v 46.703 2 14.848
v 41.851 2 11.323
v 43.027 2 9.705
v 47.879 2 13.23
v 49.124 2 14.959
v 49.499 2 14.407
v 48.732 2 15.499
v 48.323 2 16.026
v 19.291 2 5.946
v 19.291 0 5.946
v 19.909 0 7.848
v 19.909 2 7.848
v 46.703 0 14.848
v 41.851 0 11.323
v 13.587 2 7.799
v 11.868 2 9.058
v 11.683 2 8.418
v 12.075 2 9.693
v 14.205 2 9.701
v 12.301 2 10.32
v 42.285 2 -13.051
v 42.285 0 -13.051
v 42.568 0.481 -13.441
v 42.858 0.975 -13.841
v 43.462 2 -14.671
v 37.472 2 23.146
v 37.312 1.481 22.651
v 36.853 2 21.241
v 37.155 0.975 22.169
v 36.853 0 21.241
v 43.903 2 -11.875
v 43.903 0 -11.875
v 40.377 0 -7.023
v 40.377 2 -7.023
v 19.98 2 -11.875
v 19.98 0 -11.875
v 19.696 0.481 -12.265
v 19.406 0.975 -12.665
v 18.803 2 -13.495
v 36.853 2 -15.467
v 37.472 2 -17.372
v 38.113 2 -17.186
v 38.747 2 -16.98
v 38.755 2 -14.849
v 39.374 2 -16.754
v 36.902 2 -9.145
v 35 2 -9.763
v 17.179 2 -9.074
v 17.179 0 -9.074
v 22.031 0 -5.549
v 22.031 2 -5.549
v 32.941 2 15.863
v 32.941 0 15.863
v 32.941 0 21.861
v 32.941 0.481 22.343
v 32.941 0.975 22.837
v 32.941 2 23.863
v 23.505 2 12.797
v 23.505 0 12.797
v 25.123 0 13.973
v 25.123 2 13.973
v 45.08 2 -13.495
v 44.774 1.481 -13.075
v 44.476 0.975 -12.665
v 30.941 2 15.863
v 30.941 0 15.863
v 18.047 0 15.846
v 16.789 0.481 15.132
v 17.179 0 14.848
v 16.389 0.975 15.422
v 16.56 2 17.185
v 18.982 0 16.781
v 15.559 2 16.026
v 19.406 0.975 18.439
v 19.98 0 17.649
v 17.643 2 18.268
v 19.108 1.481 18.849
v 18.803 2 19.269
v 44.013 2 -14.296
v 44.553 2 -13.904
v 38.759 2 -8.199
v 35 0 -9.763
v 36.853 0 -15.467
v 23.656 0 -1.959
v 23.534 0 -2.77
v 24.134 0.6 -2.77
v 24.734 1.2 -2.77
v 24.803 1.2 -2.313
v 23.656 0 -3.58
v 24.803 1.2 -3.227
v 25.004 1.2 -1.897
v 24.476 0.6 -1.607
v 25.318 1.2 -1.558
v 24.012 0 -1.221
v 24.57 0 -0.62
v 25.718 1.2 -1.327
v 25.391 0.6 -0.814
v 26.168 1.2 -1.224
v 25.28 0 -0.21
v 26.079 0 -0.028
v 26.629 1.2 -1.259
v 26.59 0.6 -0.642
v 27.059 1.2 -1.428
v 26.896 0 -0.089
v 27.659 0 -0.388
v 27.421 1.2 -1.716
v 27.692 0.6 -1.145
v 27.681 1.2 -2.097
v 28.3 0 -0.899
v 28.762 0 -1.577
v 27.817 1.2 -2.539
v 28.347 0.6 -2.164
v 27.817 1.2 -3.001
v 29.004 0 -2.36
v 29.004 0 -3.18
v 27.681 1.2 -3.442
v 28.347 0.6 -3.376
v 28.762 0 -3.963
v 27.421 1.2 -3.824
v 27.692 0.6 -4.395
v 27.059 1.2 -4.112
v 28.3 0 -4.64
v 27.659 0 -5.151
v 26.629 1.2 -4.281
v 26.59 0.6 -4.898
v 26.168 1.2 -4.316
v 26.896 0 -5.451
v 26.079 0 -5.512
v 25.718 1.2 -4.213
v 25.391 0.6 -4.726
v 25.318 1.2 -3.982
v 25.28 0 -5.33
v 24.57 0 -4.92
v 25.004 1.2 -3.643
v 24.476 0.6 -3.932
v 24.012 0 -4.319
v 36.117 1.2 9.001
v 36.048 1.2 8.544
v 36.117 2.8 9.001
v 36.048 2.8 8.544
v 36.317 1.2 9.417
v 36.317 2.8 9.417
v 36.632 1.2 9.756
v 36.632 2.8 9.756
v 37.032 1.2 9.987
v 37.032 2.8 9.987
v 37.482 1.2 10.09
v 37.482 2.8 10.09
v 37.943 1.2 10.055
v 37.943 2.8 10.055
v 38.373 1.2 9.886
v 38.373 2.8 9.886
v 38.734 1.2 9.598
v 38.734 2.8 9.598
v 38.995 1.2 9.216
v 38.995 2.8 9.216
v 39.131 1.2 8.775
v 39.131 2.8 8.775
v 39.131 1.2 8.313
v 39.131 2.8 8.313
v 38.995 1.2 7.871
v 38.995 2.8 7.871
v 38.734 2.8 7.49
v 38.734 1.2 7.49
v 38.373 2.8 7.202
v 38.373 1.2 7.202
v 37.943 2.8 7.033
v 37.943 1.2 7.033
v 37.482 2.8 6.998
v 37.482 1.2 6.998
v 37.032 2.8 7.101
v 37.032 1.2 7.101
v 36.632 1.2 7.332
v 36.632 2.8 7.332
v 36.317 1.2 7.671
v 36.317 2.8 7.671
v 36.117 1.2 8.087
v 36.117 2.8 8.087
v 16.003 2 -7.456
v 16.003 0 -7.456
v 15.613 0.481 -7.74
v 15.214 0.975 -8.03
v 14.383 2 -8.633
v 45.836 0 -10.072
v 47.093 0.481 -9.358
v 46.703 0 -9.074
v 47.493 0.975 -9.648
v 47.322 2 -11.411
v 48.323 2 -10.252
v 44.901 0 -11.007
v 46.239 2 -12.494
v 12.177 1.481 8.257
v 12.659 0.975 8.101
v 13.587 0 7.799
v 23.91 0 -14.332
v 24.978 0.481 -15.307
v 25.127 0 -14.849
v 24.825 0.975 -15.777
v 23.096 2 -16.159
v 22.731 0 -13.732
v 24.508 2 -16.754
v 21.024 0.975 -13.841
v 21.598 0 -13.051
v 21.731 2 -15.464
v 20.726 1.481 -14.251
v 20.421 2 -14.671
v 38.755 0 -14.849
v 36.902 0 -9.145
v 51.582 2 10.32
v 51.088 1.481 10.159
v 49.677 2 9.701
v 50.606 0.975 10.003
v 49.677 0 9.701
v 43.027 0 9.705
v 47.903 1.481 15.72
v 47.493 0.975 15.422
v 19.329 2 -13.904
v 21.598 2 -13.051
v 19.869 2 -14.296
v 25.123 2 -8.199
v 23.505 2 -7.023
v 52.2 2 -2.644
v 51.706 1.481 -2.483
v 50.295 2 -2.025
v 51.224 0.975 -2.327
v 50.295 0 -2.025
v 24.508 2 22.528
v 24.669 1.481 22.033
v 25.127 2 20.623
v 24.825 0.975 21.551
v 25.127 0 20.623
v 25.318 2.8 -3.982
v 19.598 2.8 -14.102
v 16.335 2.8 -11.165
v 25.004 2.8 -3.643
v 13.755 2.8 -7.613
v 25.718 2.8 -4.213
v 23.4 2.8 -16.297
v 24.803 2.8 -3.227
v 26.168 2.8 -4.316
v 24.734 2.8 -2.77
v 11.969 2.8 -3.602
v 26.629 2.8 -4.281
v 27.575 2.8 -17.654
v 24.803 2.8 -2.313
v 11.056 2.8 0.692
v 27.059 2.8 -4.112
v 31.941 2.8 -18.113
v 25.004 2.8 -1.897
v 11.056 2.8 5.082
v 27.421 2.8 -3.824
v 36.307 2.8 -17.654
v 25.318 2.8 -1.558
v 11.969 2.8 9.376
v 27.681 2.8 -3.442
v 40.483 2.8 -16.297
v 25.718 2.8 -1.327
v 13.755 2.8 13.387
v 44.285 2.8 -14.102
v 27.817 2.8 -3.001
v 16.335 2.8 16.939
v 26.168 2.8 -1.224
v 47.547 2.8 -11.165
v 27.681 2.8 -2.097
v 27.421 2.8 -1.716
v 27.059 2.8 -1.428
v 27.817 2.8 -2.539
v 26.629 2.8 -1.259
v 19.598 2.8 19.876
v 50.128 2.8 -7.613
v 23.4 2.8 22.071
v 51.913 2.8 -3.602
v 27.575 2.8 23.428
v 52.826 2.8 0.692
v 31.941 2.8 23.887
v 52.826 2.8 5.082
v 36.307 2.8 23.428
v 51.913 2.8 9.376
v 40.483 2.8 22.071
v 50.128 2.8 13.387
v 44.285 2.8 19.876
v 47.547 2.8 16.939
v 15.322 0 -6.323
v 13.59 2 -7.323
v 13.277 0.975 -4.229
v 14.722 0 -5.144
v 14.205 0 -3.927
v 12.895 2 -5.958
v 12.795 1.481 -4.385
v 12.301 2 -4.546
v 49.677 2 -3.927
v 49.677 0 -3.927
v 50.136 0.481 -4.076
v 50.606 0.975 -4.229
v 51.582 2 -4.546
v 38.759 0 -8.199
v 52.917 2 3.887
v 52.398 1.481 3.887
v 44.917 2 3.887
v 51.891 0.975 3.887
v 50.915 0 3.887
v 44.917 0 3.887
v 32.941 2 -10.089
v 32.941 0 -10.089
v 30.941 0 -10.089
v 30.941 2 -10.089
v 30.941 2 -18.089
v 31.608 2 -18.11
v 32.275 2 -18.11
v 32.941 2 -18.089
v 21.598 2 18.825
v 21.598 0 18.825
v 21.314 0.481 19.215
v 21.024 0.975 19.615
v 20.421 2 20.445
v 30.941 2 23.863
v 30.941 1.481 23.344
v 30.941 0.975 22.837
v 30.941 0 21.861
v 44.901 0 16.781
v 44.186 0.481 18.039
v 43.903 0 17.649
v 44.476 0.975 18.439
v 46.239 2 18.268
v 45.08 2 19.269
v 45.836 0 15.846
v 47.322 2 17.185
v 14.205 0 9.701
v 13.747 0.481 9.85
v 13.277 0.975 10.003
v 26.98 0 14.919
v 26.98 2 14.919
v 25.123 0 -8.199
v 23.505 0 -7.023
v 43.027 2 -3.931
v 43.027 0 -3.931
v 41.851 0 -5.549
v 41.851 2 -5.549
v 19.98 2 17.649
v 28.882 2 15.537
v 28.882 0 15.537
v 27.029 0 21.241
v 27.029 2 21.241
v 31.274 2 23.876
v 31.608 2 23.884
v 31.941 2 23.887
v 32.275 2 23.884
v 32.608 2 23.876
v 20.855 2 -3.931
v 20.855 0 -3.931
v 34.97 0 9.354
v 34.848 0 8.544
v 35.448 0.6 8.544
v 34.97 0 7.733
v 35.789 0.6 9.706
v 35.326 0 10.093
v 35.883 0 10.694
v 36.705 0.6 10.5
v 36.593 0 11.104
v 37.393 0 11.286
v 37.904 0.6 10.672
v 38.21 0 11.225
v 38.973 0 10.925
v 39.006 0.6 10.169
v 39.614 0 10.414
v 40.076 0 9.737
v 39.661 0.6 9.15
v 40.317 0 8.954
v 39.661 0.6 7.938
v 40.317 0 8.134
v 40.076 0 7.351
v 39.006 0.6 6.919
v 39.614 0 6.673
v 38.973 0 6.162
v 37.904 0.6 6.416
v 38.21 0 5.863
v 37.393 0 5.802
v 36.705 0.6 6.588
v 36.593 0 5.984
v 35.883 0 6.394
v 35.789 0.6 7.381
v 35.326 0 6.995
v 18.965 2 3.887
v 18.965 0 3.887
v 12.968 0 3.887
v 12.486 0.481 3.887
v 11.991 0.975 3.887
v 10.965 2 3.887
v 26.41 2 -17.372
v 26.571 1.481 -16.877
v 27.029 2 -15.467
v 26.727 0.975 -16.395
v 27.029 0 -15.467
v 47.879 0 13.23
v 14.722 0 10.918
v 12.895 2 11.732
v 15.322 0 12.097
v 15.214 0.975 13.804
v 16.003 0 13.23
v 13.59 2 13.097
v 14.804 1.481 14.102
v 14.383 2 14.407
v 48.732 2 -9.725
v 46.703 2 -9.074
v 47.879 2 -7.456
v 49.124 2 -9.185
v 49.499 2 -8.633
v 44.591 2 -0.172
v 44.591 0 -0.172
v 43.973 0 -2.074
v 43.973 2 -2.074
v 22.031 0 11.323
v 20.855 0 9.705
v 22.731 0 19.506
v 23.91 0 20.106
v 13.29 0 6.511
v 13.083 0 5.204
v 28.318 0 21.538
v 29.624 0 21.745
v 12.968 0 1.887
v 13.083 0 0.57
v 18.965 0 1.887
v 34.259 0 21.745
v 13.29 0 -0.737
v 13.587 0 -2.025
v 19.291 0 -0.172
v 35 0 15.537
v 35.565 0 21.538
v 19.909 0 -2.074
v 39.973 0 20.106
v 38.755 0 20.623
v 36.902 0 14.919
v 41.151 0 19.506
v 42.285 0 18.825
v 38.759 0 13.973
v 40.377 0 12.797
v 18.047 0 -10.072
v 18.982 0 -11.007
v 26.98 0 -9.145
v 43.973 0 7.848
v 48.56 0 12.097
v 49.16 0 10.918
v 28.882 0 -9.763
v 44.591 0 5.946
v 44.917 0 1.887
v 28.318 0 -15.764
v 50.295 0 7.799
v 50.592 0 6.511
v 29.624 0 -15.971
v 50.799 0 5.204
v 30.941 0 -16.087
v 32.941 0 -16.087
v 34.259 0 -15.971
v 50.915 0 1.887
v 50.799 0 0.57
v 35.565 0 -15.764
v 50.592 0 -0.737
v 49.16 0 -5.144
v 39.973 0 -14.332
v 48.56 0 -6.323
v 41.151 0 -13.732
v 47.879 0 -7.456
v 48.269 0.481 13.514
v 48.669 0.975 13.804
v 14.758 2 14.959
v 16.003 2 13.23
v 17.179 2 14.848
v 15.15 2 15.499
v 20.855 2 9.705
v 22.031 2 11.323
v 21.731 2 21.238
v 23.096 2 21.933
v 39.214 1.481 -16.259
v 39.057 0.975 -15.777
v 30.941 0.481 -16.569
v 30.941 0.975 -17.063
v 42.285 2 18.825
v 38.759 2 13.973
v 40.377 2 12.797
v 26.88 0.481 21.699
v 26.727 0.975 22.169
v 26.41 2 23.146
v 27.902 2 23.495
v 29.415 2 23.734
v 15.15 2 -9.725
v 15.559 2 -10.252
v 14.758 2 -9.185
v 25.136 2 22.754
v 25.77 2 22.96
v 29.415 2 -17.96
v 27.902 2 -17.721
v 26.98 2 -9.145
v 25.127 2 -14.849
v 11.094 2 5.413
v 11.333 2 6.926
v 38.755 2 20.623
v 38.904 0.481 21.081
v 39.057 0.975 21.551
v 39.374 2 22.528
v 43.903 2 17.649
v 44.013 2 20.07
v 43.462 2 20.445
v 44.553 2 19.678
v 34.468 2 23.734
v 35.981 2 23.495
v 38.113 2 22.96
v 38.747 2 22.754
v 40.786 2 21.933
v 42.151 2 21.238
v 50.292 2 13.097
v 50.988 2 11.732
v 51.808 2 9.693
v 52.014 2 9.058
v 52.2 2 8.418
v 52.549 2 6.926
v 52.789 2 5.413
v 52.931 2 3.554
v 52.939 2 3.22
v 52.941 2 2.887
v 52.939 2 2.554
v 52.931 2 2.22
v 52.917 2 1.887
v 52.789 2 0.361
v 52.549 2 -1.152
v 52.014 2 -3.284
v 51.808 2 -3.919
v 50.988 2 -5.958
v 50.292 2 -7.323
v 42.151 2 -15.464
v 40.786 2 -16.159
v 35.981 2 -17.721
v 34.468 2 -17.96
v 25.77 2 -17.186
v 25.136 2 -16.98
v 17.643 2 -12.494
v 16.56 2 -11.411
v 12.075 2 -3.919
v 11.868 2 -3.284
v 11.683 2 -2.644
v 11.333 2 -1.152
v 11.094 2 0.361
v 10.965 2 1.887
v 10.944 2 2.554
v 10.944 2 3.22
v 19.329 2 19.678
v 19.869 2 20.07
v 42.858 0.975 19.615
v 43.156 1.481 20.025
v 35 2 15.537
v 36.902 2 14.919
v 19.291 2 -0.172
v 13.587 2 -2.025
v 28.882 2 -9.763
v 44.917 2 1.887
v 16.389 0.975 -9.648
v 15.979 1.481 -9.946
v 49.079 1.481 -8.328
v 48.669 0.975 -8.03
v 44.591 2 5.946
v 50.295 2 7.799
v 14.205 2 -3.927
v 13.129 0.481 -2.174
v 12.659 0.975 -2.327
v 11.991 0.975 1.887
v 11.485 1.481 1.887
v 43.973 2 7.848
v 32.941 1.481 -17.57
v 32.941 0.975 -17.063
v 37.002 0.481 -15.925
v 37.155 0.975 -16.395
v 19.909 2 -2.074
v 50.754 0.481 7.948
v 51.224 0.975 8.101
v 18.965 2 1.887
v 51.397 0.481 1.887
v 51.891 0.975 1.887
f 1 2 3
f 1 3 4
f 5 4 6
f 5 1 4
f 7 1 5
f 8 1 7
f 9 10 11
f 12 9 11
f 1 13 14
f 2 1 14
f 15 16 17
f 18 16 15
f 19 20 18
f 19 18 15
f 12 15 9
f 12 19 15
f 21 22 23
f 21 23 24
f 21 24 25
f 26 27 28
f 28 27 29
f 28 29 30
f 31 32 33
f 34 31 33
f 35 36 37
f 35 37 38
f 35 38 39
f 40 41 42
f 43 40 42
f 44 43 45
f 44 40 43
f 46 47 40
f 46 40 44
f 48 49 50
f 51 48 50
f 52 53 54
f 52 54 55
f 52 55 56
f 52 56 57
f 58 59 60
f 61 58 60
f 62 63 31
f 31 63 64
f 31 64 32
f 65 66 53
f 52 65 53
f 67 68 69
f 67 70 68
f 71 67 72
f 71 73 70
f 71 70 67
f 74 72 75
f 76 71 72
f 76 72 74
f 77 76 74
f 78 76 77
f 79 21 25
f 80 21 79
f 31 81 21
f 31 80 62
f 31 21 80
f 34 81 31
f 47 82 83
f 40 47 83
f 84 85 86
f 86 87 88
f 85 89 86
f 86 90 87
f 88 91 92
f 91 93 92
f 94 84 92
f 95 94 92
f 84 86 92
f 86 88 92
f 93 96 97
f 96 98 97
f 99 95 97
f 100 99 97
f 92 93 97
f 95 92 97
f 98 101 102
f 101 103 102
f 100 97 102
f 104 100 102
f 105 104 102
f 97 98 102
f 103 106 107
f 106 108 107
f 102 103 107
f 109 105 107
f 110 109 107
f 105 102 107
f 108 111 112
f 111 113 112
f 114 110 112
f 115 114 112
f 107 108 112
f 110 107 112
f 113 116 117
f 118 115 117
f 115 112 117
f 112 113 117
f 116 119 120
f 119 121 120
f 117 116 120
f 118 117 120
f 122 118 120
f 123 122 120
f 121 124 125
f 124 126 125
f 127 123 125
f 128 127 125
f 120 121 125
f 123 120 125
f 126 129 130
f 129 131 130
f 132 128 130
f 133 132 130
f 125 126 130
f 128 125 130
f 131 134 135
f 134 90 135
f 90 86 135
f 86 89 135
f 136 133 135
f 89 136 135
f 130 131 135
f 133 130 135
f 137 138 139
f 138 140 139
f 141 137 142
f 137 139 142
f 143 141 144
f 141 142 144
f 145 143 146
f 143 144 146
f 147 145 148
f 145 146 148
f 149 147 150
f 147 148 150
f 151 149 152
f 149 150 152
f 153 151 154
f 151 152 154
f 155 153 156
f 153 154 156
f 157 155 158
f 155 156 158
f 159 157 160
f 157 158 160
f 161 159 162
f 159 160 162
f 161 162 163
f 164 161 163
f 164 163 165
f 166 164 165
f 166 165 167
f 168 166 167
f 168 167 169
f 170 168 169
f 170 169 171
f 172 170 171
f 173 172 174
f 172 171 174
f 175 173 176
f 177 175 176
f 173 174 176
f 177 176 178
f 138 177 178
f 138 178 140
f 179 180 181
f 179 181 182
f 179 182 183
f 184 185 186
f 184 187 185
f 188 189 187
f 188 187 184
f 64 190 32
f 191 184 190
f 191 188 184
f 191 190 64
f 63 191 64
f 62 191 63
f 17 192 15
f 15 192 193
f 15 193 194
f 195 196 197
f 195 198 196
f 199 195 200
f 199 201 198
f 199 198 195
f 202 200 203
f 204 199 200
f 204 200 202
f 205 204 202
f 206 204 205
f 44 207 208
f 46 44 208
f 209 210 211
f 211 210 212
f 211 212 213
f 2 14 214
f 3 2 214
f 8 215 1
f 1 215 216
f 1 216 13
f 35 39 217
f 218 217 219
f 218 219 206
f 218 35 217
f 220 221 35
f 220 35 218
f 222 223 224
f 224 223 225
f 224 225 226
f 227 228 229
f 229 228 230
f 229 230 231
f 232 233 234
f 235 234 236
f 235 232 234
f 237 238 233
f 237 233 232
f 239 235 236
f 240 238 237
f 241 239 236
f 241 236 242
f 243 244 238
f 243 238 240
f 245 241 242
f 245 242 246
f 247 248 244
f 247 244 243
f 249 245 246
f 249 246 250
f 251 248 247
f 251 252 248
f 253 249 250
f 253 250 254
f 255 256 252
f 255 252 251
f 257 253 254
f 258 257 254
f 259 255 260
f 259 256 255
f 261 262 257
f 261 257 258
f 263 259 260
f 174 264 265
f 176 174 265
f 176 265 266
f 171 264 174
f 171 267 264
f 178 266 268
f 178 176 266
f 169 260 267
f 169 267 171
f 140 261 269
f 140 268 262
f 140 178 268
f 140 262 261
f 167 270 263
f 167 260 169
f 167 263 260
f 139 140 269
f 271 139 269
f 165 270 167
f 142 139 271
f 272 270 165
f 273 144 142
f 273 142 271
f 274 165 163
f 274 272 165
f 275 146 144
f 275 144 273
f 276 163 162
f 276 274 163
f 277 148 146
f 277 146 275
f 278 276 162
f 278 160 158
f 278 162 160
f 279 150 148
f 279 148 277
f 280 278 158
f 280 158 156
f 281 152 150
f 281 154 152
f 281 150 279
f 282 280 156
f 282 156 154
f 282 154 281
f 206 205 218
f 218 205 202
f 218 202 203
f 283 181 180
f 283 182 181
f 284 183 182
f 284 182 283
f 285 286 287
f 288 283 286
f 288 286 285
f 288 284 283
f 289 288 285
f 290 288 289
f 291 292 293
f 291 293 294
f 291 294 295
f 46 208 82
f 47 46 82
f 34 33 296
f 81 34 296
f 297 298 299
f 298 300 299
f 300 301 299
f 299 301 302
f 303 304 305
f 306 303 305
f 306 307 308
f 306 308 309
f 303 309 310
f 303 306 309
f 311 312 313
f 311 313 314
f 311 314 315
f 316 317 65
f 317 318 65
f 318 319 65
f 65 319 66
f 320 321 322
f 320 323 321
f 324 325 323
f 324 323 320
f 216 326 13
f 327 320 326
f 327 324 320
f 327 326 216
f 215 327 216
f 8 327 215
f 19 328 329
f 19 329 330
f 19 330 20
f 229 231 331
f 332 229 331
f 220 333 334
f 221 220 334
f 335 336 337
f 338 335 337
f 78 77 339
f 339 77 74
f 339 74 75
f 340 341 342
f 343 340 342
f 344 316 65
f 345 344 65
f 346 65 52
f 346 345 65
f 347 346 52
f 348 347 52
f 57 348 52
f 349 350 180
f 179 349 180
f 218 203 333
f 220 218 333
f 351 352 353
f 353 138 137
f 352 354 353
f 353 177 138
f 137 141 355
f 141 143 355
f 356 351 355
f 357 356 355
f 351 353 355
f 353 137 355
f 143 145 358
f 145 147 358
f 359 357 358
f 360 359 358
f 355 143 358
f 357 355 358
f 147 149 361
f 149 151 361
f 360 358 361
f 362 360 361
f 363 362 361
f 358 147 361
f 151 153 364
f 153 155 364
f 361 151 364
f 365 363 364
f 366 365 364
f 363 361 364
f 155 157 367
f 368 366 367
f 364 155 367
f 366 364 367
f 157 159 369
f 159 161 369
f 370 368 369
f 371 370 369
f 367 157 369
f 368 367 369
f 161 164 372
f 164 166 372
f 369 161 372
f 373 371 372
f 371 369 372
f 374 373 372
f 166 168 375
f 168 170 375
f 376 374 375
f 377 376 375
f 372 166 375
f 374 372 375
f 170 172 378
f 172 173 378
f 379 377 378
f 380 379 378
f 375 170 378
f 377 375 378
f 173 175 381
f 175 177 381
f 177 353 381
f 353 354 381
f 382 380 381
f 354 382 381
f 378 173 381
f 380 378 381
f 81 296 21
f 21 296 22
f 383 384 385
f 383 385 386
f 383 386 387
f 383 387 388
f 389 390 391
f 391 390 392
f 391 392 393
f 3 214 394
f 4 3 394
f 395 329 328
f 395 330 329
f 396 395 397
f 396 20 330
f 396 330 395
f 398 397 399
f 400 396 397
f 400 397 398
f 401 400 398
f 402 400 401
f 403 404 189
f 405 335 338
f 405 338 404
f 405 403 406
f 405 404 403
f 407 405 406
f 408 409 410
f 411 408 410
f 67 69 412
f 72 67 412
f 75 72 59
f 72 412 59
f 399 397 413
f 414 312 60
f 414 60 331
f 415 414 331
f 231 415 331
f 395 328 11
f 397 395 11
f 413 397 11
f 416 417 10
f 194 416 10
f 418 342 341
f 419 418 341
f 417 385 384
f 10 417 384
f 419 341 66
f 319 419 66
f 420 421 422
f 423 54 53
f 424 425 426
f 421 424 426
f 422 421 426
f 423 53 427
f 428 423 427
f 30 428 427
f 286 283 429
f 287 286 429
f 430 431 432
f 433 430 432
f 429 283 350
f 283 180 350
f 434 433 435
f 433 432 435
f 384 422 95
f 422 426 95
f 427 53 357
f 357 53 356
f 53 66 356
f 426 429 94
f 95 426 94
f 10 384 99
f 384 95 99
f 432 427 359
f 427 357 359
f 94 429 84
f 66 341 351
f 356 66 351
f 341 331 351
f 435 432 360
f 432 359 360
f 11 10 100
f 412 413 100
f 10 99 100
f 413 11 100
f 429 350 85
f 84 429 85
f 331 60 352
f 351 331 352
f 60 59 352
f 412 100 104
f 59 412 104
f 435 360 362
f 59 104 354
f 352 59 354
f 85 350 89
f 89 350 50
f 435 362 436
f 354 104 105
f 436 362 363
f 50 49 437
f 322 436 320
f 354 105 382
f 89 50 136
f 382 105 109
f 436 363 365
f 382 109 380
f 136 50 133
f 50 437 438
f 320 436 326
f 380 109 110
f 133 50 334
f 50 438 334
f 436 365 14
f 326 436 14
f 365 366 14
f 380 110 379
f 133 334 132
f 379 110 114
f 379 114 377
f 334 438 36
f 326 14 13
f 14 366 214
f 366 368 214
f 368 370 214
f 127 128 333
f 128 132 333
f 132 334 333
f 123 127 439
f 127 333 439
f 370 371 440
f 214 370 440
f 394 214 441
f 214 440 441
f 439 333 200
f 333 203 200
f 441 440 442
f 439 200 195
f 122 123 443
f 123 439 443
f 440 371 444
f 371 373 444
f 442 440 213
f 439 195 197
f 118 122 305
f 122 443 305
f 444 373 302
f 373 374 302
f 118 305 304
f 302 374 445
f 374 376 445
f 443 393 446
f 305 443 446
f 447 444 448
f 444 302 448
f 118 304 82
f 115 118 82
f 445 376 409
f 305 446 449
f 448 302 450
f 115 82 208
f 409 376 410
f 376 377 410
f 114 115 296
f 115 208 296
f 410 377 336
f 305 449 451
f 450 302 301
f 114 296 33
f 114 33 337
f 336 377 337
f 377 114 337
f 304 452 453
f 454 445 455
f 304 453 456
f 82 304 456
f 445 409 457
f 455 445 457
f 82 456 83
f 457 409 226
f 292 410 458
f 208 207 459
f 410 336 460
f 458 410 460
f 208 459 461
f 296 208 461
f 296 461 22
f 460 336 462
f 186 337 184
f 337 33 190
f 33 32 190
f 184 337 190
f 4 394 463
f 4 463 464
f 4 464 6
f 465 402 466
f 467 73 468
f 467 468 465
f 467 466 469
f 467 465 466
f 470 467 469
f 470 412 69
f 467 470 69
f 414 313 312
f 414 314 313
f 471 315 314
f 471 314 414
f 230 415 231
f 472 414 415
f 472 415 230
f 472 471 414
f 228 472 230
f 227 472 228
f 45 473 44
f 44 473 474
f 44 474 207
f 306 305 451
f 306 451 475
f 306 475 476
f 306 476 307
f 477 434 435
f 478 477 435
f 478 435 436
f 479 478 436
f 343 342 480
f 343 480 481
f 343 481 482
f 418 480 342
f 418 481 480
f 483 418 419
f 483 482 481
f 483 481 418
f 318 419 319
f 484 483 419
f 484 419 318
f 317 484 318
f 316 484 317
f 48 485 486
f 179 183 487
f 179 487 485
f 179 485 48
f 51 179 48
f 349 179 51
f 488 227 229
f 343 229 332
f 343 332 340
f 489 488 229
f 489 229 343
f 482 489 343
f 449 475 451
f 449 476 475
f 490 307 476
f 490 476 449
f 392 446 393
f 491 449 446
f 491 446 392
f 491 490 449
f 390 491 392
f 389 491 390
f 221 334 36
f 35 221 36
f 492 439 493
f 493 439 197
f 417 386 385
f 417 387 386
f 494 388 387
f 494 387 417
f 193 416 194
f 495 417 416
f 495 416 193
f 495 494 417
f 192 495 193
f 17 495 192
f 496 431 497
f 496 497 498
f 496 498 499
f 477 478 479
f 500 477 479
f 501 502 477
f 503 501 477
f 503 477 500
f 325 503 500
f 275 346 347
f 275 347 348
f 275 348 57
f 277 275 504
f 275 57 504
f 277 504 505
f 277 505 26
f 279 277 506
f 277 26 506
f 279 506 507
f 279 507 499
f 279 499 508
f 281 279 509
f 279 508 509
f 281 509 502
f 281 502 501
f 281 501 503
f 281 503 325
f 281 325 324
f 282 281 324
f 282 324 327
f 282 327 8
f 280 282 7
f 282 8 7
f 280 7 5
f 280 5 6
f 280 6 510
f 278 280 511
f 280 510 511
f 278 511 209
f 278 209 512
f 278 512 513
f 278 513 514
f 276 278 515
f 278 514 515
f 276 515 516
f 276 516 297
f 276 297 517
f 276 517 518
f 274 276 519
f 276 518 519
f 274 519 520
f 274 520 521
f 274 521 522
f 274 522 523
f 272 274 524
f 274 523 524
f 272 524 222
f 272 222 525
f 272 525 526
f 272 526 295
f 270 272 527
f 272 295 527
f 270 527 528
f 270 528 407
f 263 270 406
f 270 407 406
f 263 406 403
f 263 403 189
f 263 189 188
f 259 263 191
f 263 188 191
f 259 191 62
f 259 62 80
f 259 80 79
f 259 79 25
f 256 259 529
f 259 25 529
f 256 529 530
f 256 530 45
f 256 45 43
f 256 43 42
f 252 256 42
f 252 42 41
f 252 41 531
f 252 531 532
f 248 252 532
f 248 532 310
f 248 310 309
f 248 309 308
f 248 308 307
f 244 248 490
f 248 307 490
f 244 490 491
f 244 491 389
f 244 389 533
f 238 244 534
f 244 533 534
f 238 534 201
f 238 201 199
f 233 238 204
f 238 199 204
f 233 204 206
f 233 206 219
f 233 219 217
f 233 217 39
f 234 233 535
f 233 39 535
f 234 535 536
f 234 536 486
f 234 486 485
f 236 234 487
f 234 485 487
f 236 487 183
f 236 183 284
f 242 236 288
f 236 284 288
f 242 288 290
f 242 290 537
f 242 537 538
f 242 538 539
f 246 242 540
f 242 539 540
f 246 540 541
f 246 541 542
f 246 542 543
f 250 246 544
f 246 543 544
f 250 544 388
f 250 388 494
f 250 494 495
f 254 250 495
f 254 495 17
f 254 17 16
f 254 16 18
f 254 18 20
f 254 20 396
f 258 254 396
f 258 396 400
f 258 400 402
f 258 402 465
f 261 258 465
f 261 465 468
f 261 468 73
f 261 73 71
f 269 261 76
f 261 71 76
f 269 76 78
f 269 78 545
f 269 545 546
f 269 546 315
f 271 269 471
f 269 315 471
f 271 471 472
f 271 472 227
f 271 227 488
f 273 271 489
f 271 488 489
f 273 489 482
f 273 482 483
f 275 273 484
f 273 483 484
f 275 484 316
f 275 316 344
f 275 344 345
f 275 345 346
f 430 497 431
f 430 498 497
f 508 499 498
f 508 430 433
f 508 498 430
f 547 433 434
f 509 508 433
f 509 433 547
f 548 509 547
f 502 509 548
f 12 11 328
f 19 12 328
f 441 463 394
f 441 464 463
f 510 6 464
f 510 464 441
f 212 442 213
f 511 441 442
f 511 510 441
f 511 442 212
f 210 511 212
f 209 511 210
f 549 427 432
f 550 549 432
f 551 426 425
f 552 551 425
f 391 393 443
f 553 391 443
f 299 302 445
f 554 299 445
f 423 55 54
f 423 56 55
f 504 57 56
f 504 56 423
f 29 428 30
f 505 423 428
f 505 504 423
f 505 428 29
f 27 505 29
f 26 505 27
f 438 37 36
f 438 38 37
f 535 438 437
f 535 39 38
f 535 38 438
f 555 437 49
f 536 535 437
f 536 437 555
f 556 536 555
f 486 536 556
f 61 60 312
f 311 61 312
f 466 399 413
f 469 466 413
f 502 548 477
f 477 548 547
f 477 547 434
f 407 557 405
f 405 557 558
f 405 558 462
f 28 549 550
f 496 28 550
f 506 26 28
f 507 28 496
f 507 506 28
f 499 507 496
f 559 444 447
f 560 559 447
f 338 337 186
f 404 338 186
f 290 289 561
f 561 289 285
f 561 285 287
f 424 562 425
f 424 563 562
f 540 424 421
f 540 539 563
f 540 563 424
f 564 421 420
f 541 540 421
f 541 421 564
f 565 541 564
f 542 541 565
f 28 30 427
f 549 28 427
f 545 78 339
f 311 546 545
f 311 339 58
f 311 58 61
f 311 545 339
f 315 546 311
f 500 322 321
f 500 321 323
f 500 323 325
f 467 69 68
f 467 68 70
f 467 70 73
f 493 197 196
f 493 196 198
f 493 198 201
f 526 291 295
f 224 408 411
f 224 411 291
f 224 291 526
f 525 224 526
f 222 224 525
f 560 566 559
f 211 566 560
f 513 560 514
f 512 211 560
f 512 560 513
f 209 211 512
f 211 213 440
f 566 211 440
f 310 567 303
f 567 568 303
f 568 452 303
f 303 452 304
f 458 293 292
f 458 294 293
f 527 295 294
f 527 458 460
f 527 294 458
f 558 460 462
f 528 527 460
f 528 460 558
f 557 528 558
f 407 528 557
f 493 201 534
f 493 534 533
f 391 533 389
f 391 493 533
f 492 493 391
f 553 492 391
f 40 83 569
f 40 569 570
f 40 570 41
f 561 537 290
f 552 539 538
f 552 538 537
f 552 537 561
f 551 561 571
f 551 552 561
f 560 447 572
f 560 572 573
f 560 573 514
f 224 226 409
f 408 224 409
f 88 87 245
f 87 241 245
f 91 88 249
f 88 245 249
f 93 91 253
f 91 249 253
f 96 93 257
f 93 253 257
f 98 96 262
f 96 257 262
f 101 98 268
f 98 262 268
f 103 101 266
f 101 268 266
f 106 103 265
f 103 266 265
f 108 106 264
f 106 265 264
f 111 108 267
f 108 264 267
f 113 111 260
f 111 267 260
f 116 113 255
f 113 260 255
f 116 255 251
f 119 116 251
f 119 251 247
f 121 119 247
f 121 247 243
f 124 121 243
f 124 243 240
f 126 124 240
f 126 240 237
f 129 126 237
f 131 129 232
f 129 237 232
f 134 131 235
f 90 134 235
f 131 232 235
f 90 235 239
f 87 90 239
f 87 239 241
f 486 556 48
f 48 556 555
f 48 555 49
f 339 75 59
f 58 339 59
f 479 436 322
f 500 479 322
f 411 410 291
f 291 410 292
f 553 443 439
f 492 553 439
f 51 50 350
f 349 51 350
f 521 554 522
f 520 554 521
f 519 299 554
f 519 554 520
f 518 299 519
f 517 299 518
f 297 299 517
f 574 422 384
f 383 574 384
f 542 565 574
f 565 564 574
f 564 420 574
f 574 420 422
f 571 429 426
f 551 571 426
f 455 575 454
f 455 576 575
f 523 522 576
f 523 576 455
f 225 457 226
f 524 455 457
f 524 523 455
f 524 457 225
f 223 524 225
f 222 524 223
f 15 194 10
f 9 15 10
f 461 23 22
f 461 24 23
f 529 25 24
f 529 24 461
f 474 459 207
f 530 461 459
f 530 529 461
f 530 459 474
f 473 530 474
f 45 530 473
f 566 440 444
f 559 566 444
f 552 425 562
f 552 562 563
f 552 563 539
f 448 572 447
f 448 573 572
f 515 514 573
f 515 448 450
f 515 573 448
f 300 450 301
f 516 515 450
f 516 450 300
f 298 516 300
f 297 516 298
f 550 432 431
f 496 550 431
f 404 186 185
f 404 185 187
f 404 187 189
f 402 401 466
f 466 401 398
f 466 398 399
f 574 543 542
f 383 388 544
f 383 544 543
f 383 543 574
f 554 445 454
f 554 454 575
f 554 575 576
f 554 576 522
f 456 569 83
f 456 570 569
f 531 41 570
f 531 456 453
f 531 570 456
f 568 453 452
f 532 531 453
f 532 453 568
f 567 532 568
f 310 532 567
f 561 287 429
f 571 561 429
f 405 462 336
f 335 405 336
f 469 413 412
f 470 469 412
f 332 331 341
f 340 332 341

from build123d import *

# Parameters (mm, degrees)
SKETCH2_R                                         = 21
SKETCH2_R_2                                       = 7.5
BOSS_EXTRUDE1_DEPTH                               = 2.8
CSK_FOR_M2_5_FLAT_HEAD_MACHINE_SCREW1_D           = 3.1
CSK_FOR_M2_5_FLAT_HEAD_MACHINE_SCREW1_CSINK_D     = 5.5
CSK_FOR_M2_5_FLAT_HEAD_MACHINE_SCREW1_CSINK_ANGLE = 90
CHAMFER1_SIZE                                     = 2
CUT_EXTRUDE1_DEPTH                                = 2


with BuildPart() as part:
    # Sketch2 → Boss-Extrude1 (new body)
    # profile 1 of 3: a face of its own
    with BuildSketch(Plane(origin=(0, 0, 0), x_dir=(1, 0, 0), z_dir=(0, 1, 0))):
        with Locations(Location((31.941171231, -2.886996739, 0), (0, 0, 270))):
            Circle(SKETCH2_R)
        with Locations((22.748783076, -12.079384894)):
            Circle(SKETCH2_R_2, mode=Mode.SUBTRACT)
        with Locations((41.133559387, 6.305391417)):
            Circle(SKETCH2_R_2, mode=Mode.SUBTRACT)
    # profile 2 of 3: a face of its own
    with BuildSketch(Plane(origin=(0, 0, 0), x_dir=(1, 0, 0), z_dir=(0, 1, 0))):
        with Locations((22.748783076, -12.079384894)):
            Circle(SKETCH2_R_2)
    # profile 3 of 3: a face of its own
    with BuildSketch(Plane(origin=(0, 0, 0), x_dir=(1, 0, 0), z_dir=(0, 1, 0))):
        with Locations((41.133559387, 6.305391417)):
            Circle(SKETCH2_R_2)
    extrude(amount=BOSS_EXTRUDE1_DEPTH)

    # CSK for M2.5 Flat Head Machine Screw1 (through all)
    with Locations(Plane.XZ):
        with Locations((26.284316982, -2.769857511), (37.598025481, 8.543850988)):
            CounterSinkHole(CSK_FOR_M2_5_FLAT_HEAD_MACHINE_SCREW1_D / 2, CSK_FOR_M2_5_FLAT_HEAD_MACHINE_SCREW1_CSINK_D / 2, counter_sink_angle=CSK_FOR_M2_5_FLAT_HEAD_MACHINE_SCREW1_CSINK_ANGLE)

    # Chamfer1
    chamfer1_edges = [part.edges().sort_by_distance(p)[0] for p in [
        (31.941171231, 0, -18.113003261),
    ]]
    chamfer(chamfer1_edges, length=CHAMFER1_SIZE)

    # Sketch5 → Cut-Extrude1 (cut)
    with BuildSketch(Plane.XZ):
        with BuildLine():
            Line((19.291076579, -0.171805949), (13.587125587, -2.025131973))
            ThreePointArc((13.587125587, -2.025131973), (13.871097422, -2.984326154), (14.205159576, -3.927245005))
            Line((14.205159576, -3.927245005), (19.909110568, -2.073918981))
            Line((19.909110568, -2.073918981), (19.291076579, -0.171805949))
        make_face()
        with BuildLine():
            Line((20.855438294, -3.931191717), (16.003367771, -7.456427301))
            ThreePointArc((16.003367771, -7.456427301), (16.569848338, -8.280923055), (17.178938276, -9.07446129))
            Line((17.178938276, -9.07446129), (22.031008798, -5.549225706))
            Line((22.031008798, -5.549225706), (20.855438294, -3.931191717))
        make_face()
        with BuildLine():
            Line((23.504948787, -7.023165694), (19.979713203, -11.875236217))
            ThreePointArc((19.979713203, -11.875236217), (20.773251438, -12.484326154), (21.597747192, -13.050806722))
            Line((21.597747192, -13.050806722), (25.122982776, -8.198736199))
            Line((25.122982776, -8.198736199), (23.504948787, -7.023165694))
        make_face()
        with BuildLine():
            Line((19.979713203, -11.875236217), (18.802666769, -13.495301649))
            ThreePointArc((18.802666769, -13.495301649), (19.597680933, -14.102360143), (20.420700757, -14.670872154))
            Line((20.420700757, -14.670872154), (21.597747192, -13.050806722))
            ThreePointArc((21.597747192, -13.050806722), (20.773251438, -12.484326154), (19.979713203, -11.875236217))
        make_face()
        with BuildLine():
            Line((25.126929488, -14.849014917), (24.508119556, -16.753516055))
            ThreePointArc((24.508119556, -16.753516055), (25.45181435, -17.085190104), (26.410232589, -17.371550044))
            Line((26.410232589, -17.371550044), (27.02904252, -15.467048906))
            ThreePointArc((27.02904252, -15.467048906), (26.069848338, -15.183077071), (25.126929488, -14.849014917))
        make_face()
        with BuildLine():
            Line((26.980255511, -9.145063925), (25.126929488, -14.849014917))
            ThreePointArc((25.126929488, -14.849014917), (26.069848338, -15.183077071), (27.02904252, -15.467048906))
            Line((27.02904252, -15.467048906), (28.882368544, -9.763097913))
            Line((28.882368544, -9.763097913), (26.980255511, -9.145063925))
        make_face()
        with BuildLine():
            Line((30.941171231, -10.089180225), (30.941171231, -16.086669222))
            ThreePointArc((30.941171231, -16.086669222), (31.941171231, -16.113003261), (32.941171231, -16.086669222))
            Line((32.941171231, -16.086669222), (32.941171231, -10.089180225))
            Line((32.941171231, -10.089180225), (30.941171231, -10.089180225))
        make_face()
        with BuildLine():
            Line((30.941171231, -16.086669222), (30.941171231, -18.089180225))
            ThreePointArc((30.941171231, -18.089180225), (31.941171231, -18.113003261), (32.941171231, -18.089180225))
            Line((32.941171231, -18.089180225), (32.941171231, -16.086669222))
            ThreePointArc((32.941171231, -16.086669222), (31.941171231, -16.113003261), (30.941171231, -16.086669222))
        make_face()
        with BuildLine():
            ThreePointArc((36.853299943, -15.467048906), (37.812494125, -15.183077071), (38.755412975, -14.849014917))
            Line((38.755412975, -14.849014917), (36.902086951, -9.145063925))
            Line((36.902086951, -9.145063925), (34.999973919, -9.763097913))
            Line((34.999973919, -9.763097913), (36.853299943, -15.467048906))
        make_face()
        with BuildLine():
            ThreePointArc((37.472109874, -17.371550044), (38.430528113, -17.085190104), (39.374222906, -16.753516055))
            Line((39.374222906, -16.753516055), (38.755412975, -14.849014917))
            ThreePointArc((38.755412975, -14.849014917), (37.812494125, -15.183077071), (36.853299943, -15.467048906))
            Line((36.853299943, -15.467048906), (37.472109874, -17.371550044))
        make_face()
        with BuildLine():
            ThreePointArc((42.284595271, -13.050806722), (43.109091025, -12.484326154), (43.90262926, -11.875236217))
            Line((43.90262926, -11.875236217), (40.377393676, -7.023165694))
            Line((40.377393676, -7.023165694), (38.759359687, -8.198736199))
            Line((38.759359687, -8.198736199), (42.284595271, -13.050806722))
        make_face()
        with BuildLine():
            ThreePointArc((43.461641706, -14.670872154), (44.28466153, -14.102360143), (45.079675694, -13.495301649))
            Line((45.079675694, -13.495301649), (43.90262926, -11.875236217))
            ThreePointArc((43.90262926, -11.875236217), (43.109091025, -12.484326154), (42.284595271, -13.050806722))
            Line((42.284595271, -13.050806722), (43.461641706, -14.670872154))
        make_face()
        with BuildLine():
            ThreePointArc((46.703404187, -9.07446129), (47.312494125, -8.280923055), (47.878974692, -7.456427301))
            Line((47.878974692, -7.456427301), (43.026904169, -3.931191717))
            Line((43.026904169, -3.931191717), (41.851333665, -5.549225706))
            Line((41.851333665, -5.549225706), (46.703404187, -9.07446129))
        make_face()
        with BuildLine():
            ThreePointArc((48.32346962, -10.251507724), (48.930528113, -9.456493559), (49.499040124, -8.633473736))
            Line((49.499040124, -8.633473736), (47.878974692, -7.456427301))
            ThreePointArc((47.878974692, -7.456427301), (47.312494125, -8.280923055), (46.703404187, -9.07446129))
            Line((46.703404187, -9.07446129), (48.32346962, -10.251507724))
        make_face()
        with BuildLine():
            ThreePointArc((49.677182887, -3.927245005), (50.011245041, -2.984326154), (50.295216876, -2.025131973))
            Line((50.295216876, -2.025131973), (44.591265883, -0.171805949))
            Line((44.591265883, -0.171805949), (43.973231895, -2.073918981))
            Line((43.973231895, -2.073918981), (49.677182887, -3.927245005))
        make_face()
        with BuildLine():
            ThreePointArc((51.581684025, -4.546054936), (51.913358074, -3.602360143), (52.199718014, -2.643941904))
            Line((52.199718014, -2.643941904), (50.295216876, -2.025131973))
            ThreePointArc((50.295216876, -2.025131973), (50.011245041, -2.984326154), (49.677182887, -3.927245005))
            Line((49.677182887, -3.927245005), (51.581684025, -4.546054936))
        make_face()
        with BuildLine():
            ThreePointArc((52.941171231, 2.886996739), (52.935214628, 3.387138603), (52.917348195, 3.886996739))
            Line((52.917348195, 3.886996739), (50.914837192, 3.886996739))
            ThreePointArc((50.914837192, 3.886996739), (50.934586581, 3.387170079), (50.941171231, 2.886996739))
            ThreePointArc((50.941171231, 2.886996739), (50.934586581, 2.386823398), (50.914837192, 1.886996739))
            Line((50.914837192, 1.886996739), (52.917348195, 1.886996739))
            ThreePointArc((52.917348195, 1.886996739), (52.935214628, 2.386854875), (52.941171231, 2.886996739))
        make_face()
        with BuildLine():
            ThreePointArc((50.941171231, 2.886996739), (50.934586581, 3.387170079), (50.914837192, 3.886996739))
            Line((50.914837192, 3.886996739), (44.917348195, 3.886996739))
            Line((44.917348195, 3.886996739), (44.917348195, 1.886996739))
            Line((44.917348195, 1.886996739), (50.914837192, 1.886996739))
            ThreePointArc((50.914837192, 1.886996739), (50.934586581, 2.386823398), (50.941171231, 2.886996739))
        make_face()
        with BuildLine():
            ThreePointArc((52.199718014, 8.417935381), (51.913358074, 9.376353621), (51.581684025, 10.320048414))
            Line((51.581684025, 10.320048414), (49.677182887, 9.701238483))
            ThreePointArc((49.677182887, 9.701238483), (50.011245041, 8.758319632), (50.295216876, 7.79912545))
            Line((50.295216876, 7.79912545), (52.199718014, 8.417935381))
        make_face()
        with BuildLine():
            ThreePointArc((50.295216876, 7.79912545), (50.011245041, 8.758319632), (49.677182887, 9.701238483))
            Line((49.677182887, 9.701238483), (43.973231895, 7.847912459))
            Line((43.973231895, 7.847912459), (44.591265883, 5.945799426))
            Line((44.591265883, 5.945799426), (50.295216876, 7.79912545))
        make_face()
        with BuildLine():
            ThreePointArc((49.499040124, 14.407467213), (48.930528113, 15.230487037), (48.32346962, 16.025501202))
            Line((48.32346962, 16.025501202), (46.703404187, 14.848454767))
            ThreePointArc((46.703404187, 14.848454767), (47.312494125, 14.054916532), (47.878974692, 13.230420778))
            Line((47.878974692, 13.230420778), (49.499040124, 14.407467213))
        make_face()
        with BuildLine():
            ThreePointArc((47.878974692, 13.230420778), (47.312494125, 14.054916532), (46.703404187, 14.848454767))
            Line((46.703404187, 14.848454767), (41.851333665, 11.323219183))
            Line((41.851333665, 11.323219183), (43.026904169, 9.705185195))
            Line((43.026904169, 9.705185195), (47.878974692, 13.230420778))
        make_face()
        with BuildLine():
            ThreePointArc((45.079675694, 19.269295127), (44.28466153, 19.876353621), (43.461641706, 20.444865631))
            Line((43.461641706, 20.444865631), (42.284595271, 18.824800199))
            ThreePointArc((42.284595271, 18.824800199), (43.109091025, 18.258319632), (43.90262926, 17.649229694))
            Line((43.90262926, 17.649229694), (45.079675694, 19.269295127))
        make_face()
        with BuildLine():
            ThreePointArc((43.90262926, 17.649229694), (43.109091025, 18.258319632), (42.284595271, 18.824800199))
            Line((42.284595271, 18.824800199), (38.759359687, 13.972729676))
            Line((38.759359687, 13.972729676), (40.377393676, 12.797159172))
            Line((40.377393676, 12.797159172), (43.90262926, 17.649229694))
        make_face()
        with BuildLine():
            ThreePointArc((39.374222906, 22.527509532), (38.430528113, 22.859183581), (37.472109874, 23.145543521))
            Line((37.472109874, 23.145543521), (36.853299943, 21.241042383))
            ThreePointArc((36.853299943, 21.241042383), (37.812494125, 20.957070548), (38.755412975, 20.623008395))
            Line((38.755412975, 20.623008395), (39.374222906, 22.527509532))
        make_face()
        with BuildLine():
            ThreePointArc((38.755412975, 20.623008395), (37.812494125, 20.957070548), (36.853299943, 21.241042383))
            Line((36.853299943, 21.241042383), (34.999973919, 15.537091391))
            Line((34.999973919, 15.537091391), (36.902086951, 14.919057402))
            Line((36.902086951, 14.919057402), (38.755412975, 20.623008395))
        make_face()
        with BuildLine():
            ThreePointArc((32.941171231, 23.863173702), (32.441313096, 23.881040135), (31.941171231, 23.886996739))
            Line((31.941171231, 23.886996739), (31.941171231, 21.886996739))
            ThreePointArc((31.941171231, 21.886996739), (32.441344572, 21.880412088), (32.941171231, 21.8606627))
            Line((32.941171231, 21.8606627), (32.941171231, 23.863173702))
        make_face()
        with BuildLine():
            Line((31.941171231, 21.886996739), (31.941171231, 23.886996739))
            ThreePointArc((31.941171231, 23.886996739), (31.441029367, 23.881040135), (30.941171231, 23.863173702))
            Line((30.941171231, 23.863173702), (30.941171231, 21.8606627))
            ThreePointArc((30.941171231, 21.8606627), (31.440997891, 21.880412088), (31.941171231, 21.886996739))
        make_face()
        with BuildLine():
            ThreePointArc((32.941171231, 21.8606627), (32.441344572, 21.880412088), (31.941171231, 21.886996739))
            Line((31.941171231, 21.886996739), (31.941171231, 15.863173702))
            Line((31.941171231, 15.863173702), (32.941171231, 15.863173702))
            Line((32.941171231, 15.863173702), (32.941171231, 21.8606627))
        make_face()
        with BuildLine():
            Line((31.941171231, 15.863173702), (31.941171231, 21.886996739))
            ThreePointArc((31.941171231, 21.886996739), (31.440997891, 21.880412088), (30.941171231, 21.8606627))
            Line((30.941171231, 21.8606627), (30.941171231, 15.863173702))
            Line((30.941171231, 15.863173702), (31.941171231, 15.863173702))
        make_face()
        with BuildLine():
            Line((28.882368544, 15.537091391), (27.02904252, 21.241042383))
            ThreePointArc((27.02904252, 21.241042383), (26.069848338, 20.957070548), (25.126929488, 20.623008395))
            Line((25.126929488, 20.623008395), (26.980255511, 14.919057402))
            Line((26.980255511, 14.919057402), (28.882368544, 15.537091391))
        make_face()
        with BuildLine():
            Line((27.02904252, 21.241042383), (26.410232589, 23.145543521))
            ThreePointArc((26.410232589, 23.145543521), (25.45181435, 22.859183581), (24.508119556, 22.527509532))
            Line((24.508119556, 22.527509532), (25.126929488, 20.623008395))
            ThreePointArc((25.126929488, 20.623008395), (26.069848338, 20.957070548), (27.02904252, 21.241042383))
        make_face()
        with BuildLine():
            Line((21.597747192, 18.824800199), (20.420700757, 20.444865631))
            ThreePointArc((20.420700757, 20.444865631), (19.597680933, 19.876353621), (18.802666769, 19.269295127))
            Line((18.802666769, 19.269295127), (19.979713203, 17.649229694))
            ThreePointArc((19.979713203, 17.649229694), (20.773251438, 18.258319632), (21.597747192, 18.824800199))
        make_face()
        with BuildLine():
            Line((25.122982776, 13.972729676), (21.597747192, 18.824800199))
            ThreePointArc((21.597747192, 18.824800199), (20.773251438, 18.258319632), (19.979713203, 17.649229694))
            Line((19.979713203, 17.649229694), (23.504948787, 12.797159172))
            Line((23.504948787, 12.797159172), (25.122982776, 13.972729676))
        make_face()
        with BuildLine():
            Line((17.178938276, 14.848454767), (15.558872843, 16.025501202))
            ThreePointArc((15.558872843, 16.025501202), (14.95181435, 15.230487037), (14.383302339, 14.407467213))
            Line((14.383302339, 14.407467213), (16.003367771, 13.230420778))
            ThreePointArc((16.003367771, 13.230420778), (16.569848338, 14.054916532), (17.178938276, 14.848454767))
        make_face()
        with BuildLine():
            Line((22.031008798, 11.323219183), (17.178938276, 14.848454767))
            ThreePointArc((17.178938276, 14.848454767), (16.569848338, 14.054916532), (16.003367771, 13.230420778))
            Line((16.003367771, 13.230420778), (20.855438294, 9.705185195))
            Line((20.855438294, 9.705185195), (22.031008798, 11.323219183))
        make_face()
        with BuildLine():
            Line((14.205159576, 9.701238483), (12.300658438, 10.320048414))
            ThreePointArc((12.300658438, 10.320048414), (11.968984389, 9.376353621), (11.682624449, 8.417935381))
            Line((11.682624449, 8.417935381), (13.587125587, 7.79912545))
            ThreePointArc((13.587125587, 7.79912545), (13.871097422, 8.758319632), (14.205159576, 9.701238483))
        make_face()
        with BuildLine():
            Line((19.909110568, 7.847912459), (14.205159576, 9.701238483))
            ThreePointArc((14.205159576, 9.701238483), (13.871097422, 8.758319632), (13.587125587, 7.79912545))
            Line((13.587125587, 7.79912545), (19.291076579, 5.945799426))
            Line((19.291076579, 5.945799426), (19.909110568, 7.847912459))
        make_face()
        with BuildLine():
            Line((12.96750527, 3.886996739), (10.964994268, 3.886996739))
            ThreePointArc((10.964994268, 3.886996739), (10.941171231, 2.886996739), (10.964994268, 1.886996739))
            Line((10.964994268, 1.886996739), (12.96750527, 1.886996739))
            ThreePointArc((12.96750527, 1.886996739), (12.941171231, 2.886996739), (12.96750527, 3.886996739))
        make_face()
        with BuildLine():
            Line((18.964994268, 3.886996739), (12.96750527, 3.886996739))
            ThreePointArc((12.96750527, 3.886996739), (12.941171231, 2.886996739), (12.96750527, 1.886996739))
            Line((12.96750527, 1.886996739), (18.964994268, 1.886996739))
            Line((18.964994268, 1.886996739), (18.964994268, 3.886996739))
        make_face()
        with BuildLine():
            Line((13.587125587, -2.025131973), (11.682624449, -2.643941904))
            ThreePointArc((11.682624449, -2.643941904), (11.968984389, -3.602360143), (12.300658438, -4.546054936))
            Line((12.300658438, -4.546054936), (14.205159576, -3.927245005))
            ThreePointArc((14.205159576, -3.927245005), (13.871097422, -2.984326154), (13.587125587, -2.025131973))
        make_face()
        with BuildLine():
            Line((16.003367771, -7.456427301), (14.383302339, -8.633473736))
            ThreePointArc((14.383302339, -8.633473736), (14.95181435, -9.456493559), (15.558872843, -10.251507724))
            Line((15.558872843, -10.251507724), (17.178938276, -9.07446129))
            ThreePointArc((17.178938276, -9.07446129), (16.569848338, -8.280923055), (16.003367771, -7.456427301))
        make_face()
    extrude(amount=-CUT_EXTRUDE1_DEPTH, mode=Mode.SUBTRACT)


solid = part.part
